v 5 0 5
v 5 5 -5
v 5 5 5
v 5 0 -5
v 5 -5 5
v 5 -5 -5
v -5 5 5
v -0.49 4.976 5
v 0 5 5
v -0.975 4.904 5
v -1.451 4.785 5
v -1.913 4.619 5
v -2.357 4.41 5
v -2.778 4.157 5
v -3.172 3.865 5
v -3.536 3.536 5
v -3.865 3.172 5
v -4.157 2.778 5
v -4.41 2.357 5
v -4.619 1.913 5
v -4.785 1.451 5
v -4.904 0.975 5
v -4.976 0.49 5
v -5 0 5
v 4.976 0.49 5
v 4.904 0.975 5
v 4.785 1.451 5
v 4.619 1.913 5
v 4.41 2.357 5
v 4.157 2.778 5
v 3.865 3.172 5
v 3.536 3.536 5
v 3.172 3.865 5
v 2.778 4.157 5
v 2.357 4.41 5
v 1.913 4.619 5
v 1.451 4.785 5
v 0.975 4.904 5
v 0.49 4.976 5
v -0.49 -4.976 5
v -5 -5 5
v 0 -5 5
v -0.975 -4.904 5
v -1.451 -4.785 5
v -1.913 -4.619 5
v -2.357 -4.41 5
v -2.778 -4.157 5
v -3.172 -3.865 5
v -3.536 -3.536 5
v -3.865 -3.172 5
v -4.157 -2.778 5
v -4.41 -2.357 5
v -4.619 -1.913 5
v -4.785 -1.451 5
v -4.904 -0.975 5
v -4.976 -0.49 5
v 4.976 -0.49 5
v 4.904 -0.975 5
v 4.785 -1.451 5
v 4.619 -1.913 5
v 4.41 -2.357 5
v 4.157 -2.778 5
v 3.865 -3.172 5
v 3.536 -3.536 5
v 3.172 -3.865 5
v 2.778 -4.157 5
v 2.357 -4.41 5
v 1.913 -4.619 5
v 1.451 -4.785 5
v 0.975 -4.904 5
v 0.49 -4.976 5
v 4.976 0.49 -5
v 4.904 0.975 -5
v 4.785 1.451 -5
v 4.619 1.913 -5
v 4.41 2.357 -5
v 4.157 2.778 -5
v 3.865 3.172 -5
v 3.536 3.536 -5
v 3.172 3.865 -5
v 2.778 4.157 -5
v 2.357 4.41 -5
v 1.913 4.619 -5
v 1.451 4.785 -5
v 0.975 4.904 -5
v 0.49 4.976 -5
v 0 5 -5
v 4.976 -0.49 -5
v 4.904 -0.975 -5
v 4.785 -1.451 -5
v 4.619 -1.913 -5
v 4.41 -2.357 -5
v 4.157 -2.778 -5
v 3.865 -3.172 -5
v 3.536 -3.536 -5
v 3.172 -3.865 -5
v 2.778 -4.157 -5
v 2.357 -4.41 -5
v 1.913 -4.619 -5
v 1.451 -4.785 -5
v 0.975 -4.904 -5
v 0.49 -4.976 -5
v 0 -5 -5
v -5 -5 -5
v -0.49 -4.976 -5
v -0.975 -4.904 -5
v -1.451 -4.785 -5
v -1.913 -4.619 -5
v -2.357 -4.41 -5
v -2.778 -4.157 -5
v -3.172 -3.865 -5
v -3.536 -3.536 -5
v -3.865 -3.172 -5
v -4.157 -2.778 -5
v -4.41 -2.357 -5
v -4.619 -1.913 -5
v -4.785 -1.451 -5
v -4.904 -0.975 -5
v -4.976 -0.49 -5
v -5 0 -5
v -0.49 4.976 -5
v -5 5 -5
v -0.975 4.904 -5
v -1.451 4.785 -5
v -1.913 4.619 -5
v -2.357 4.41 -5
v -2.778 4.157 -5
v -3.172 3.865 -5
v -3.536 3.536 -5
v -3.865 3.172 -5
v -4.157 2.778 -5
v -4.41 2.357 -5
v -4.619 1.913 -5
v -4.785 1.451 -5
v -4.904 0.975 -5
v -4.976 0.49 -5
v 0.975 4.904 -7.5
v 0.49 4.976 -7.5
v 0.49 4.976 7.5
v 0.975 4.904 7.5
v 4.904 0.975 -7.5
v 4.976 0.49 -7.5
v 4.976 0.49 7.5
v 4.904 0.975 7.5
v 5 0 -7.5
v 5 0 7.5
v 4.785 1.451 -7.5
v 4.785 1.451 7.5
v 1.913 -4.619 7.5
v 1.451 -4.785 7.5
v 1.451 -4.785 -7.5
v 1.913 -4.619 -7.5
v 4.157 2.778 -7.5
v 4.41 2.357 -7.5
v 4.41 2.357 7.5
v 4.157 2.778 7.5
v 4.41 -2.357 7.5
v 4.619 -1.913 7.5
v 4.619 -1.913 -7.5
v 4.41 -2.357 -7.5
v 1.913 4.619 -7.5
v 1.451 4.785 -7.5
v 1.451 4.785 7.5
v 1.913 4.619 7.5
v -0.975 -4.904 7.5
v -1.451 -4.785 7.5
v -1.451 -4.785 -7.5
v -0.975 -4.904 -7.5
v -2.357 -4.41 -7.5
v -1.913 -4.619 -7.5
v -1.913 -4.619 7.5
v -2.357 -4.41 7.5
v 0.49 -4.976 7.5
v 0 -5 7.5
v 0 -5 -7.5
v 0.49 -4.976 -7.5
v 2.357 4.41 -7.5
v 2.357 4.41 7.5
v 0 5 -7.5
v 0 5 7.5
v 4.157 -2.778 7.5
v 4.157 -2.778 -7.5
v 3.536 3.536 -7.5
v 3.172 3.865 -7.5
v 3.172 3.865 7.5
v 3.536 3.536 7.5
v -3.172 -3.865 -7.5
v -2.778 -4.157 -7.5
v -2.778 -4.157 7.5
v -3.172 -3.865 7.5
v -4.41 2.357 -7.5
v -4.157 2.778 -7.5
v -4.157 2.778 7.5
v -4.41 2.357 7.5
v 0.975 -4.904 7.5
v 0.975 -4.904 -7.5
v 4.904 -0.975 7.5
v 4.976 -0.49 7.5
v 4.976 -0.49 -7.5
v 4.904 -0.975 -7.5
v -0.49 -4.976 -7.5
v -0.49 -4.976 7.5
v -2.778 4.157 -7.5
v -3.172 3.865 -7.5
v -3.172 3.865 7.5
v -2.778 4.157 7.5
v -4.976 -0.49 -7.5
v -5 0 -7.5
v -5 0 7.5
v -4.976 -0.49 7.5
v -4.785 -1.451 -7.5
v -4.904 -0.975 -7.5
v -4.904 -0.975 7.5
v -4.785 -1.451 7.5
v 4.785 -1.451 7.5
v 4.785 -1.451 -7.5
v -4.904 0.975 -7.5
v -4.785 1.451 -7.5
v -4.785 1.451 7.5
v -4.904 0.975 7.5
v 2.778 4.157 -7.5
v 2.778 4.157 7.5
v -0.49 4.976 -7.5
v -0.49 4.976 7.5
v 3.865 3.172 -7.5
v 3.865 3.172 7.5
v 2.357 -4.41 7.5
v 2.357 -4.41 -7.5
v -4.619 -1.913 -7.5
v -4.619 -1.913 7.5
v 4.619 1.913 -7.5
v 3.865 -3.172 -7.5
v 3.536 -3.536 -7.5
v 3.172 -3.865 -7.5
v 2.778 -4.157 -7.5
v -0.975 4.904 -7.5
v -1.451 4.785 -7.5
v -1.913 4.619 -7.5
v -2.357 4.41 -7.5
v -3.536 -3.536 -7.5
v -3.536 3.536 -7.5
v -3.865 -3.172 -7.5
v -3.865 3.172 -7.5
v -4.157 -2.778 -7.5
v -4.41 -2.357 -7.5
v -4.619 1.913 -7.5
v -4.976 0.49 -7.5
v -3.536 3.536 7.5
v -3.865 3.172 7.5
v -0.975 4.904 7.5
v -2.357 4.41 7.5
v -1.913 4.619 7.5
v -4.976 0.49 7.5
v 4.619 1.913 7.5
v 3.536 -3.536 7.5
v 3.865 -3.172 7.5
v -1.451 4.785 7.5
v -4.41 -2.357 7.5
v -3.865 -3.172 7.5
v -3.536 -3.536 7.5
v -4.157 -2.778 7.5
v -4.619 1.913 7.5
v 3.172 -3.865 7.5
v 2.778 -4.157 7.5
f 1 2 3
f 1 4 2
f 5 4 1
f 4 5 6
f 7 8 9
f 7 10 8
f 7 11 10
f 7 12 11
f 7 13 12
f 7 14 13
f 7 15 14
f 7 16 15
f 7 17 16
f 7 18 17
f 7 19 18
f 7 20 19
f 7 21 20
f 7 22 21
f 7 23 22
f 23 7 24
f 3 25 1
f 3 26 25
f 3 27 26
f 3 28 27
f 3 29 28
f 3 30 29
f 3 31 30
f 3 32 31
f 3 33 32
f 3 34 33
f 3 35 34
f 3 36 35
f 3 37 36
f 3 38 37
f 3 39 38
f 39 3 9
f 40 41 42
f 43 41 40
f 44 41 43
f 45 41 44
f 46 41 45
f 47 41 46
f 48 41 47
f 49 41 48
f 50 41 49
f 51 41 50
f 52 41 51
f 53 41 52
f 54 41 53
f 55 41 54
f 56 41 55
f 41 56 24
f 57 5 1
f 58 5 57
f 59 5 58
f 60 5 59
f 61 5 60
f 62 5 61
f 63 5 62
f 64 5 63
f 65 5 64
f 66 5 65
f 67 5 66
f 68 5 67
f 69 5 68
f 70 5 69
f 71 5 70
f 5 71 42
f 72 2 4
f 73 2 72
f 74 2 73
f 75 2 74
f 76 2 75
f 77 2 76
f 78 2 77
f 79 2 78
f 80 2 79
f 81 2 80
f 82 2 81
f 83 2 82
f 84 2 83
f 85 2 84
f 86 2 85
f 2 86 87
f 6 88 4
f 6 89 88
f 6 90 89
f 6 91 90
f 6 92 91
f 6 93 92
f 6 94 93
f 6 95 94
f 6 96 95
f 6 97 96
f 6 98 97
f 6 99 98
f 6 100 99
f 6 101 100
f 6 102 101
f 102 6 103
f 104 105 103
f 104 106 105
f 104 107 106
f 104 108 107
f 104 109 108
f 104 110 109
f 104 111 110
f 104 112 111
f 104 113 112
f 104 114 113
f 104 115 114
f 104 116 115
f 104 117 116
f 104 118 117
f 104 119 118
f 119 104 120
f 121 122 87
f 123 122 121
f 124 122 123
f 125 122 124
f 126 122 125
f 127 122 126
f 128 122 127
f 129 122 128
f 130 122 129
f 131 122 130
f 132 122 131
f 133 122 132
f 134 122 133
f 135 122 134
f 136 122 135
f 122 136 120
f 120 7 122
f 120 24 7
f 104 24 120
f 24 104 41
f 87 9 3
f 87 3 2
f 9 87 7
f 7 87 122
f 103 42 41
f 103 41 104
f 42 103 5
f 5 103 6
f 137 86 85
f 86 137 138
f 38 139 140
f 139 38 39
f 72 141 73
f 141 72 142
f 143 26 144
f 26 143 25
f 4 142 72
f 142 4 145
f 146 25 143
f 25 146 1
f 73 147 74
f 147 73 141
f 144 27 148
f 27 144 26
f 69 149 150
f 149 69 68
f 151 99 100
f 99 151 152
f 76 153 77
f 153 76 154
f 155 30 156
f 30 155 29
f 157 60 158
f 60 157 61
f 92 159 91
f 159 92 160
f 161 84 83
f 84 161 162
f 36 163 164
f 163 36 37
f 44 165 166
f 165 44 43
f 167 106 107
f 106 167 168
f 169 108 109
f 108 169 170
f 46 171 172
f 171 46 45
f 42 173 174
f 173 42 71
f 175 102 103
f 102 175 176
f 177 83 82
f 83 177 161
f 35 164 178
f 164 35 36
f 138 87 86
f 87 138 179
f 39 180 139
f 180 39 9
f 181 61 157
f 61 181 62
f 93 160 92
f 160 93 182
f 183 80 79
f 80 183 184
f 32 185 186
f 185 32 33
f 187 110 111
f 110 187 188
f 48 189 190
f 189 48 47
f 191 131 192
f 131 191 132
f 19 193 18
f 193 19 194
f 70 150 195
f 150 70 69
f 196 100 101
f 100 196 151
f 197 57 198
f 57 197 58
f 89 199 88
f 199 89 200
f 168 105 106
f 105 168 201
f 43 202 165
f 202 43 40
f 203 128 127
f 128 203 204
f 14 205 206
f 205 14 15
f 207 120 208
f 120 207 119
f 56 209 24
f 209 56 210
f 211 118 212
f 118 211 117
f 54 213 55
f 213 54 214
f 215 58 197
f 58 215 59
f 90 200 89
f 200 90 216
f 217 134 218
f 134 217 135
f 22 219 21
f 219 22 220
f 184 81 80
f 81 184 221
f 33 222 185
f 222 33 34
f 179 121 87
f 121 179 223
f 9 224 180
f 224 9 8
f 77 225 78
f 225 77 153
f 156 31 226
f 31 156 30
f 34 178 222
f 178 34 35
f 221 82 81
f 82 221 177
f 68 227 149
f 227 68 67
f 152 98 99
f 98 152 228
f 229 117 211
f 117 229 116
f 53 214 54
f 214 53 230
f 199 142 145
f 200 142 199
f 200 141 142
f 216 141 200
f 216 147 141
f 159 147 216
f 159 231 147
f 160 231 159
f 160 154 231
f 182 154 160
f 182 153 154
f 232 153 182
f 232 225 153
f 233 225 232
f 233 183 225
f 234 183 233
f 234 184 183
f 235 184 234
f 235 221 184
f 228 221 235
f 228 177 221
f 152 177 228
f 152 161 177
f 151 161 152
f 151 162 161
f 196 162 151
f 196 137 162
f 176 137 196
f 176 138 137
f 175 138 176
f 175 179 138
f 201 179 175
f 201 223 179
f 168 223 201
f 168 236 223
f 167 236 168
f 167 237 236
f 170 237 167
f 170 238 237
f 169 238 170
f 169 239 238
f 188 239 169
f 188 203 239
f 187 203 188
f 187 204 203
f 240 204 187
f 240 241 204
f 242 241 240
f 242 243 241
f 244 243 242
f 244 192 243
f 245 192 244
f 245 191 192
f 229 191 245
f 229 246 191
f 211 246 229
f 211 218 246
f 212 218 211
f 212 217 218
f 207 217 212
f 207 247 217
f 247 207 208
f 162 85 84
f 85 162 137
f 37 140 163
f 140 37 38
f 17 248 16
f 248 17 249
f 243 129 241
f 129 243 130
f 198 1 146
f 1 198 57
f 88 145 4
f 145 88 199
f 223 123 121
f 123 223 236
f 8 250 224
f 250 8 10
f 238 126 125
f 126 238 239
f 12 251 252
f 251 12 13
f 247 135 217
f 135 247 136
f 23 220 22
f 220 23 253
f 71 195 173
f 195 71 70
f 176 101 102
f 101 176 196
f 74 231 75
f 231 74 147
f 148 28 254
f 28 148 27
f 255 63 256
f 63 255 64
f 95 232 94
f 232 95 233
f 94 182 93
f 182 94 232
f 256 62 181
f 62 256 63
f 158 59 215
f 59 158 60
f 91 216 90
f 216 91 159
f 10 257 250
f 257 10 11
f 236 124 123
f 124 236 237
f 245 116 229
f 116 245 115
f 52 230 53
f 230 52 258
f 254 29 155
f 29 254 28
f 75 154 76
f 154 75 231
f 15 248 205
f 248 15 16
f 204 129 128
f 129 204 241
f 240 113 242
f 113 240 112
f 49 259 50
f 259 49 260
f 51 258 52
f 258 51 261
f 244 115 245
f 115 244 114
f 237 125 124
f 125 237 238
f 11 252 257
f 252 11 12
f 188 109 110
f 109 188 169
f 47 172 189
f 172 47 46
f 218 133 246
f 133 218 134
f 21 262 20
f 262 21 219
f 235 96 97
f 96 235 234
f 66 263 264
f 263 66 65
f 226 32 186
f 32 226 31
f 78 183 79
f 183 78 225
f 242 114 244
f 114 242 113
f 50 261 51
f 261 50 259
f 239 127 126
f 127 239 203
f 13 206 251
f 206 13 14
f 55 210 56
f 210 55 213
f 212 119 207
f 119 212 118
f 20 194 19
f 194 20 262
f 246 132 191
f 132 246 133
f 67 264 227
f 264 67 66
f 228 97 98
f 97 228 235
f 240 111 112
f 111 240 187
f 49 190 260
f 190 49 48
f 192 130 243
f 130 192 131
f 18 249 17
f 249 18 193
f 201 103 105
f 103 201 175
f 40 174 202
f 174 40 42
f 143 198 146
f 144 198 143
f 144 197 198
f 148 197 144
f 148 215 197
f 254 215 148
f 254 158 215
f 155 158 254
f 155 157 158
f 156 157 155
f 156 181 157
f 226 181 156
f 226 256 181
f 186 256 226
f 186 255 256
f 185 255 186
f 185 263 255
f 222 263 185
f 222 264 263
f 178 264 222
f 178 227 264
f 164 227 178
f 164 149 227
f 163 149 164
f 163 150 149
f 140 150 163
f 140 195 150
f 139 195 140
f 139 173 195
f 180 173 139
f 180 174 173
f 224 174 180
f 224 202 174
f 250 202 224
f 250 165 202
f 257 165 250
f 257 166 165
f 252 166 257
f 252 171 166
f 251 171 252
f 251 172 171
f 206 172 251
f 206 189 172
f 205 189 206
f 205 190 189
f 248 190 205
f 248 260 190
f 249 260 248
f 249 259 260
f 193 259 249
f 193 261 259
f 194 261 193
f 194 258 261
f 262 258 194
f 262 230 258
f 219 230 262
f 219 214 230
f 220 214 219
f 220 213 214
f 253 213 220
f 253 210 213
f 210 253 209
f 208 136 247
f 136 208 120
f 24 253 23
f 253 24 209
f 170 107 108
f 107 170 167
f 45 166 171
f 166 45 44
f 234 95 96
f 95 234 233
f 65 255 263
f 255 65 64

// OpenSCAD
// Set fragment number for roundings
$fn = $preview ? 32 : 64;

// Cube and Cylinder combined
// The Cube is 10mm wide
// The Cylinder has a diameter of 10mm
// You wouldn't see the Cylinder
// But the Cylinder is higher (15mm)
cube(size = [10, 10, 10], center = true);
cylinder(d = 10, h = 15, center = true);
